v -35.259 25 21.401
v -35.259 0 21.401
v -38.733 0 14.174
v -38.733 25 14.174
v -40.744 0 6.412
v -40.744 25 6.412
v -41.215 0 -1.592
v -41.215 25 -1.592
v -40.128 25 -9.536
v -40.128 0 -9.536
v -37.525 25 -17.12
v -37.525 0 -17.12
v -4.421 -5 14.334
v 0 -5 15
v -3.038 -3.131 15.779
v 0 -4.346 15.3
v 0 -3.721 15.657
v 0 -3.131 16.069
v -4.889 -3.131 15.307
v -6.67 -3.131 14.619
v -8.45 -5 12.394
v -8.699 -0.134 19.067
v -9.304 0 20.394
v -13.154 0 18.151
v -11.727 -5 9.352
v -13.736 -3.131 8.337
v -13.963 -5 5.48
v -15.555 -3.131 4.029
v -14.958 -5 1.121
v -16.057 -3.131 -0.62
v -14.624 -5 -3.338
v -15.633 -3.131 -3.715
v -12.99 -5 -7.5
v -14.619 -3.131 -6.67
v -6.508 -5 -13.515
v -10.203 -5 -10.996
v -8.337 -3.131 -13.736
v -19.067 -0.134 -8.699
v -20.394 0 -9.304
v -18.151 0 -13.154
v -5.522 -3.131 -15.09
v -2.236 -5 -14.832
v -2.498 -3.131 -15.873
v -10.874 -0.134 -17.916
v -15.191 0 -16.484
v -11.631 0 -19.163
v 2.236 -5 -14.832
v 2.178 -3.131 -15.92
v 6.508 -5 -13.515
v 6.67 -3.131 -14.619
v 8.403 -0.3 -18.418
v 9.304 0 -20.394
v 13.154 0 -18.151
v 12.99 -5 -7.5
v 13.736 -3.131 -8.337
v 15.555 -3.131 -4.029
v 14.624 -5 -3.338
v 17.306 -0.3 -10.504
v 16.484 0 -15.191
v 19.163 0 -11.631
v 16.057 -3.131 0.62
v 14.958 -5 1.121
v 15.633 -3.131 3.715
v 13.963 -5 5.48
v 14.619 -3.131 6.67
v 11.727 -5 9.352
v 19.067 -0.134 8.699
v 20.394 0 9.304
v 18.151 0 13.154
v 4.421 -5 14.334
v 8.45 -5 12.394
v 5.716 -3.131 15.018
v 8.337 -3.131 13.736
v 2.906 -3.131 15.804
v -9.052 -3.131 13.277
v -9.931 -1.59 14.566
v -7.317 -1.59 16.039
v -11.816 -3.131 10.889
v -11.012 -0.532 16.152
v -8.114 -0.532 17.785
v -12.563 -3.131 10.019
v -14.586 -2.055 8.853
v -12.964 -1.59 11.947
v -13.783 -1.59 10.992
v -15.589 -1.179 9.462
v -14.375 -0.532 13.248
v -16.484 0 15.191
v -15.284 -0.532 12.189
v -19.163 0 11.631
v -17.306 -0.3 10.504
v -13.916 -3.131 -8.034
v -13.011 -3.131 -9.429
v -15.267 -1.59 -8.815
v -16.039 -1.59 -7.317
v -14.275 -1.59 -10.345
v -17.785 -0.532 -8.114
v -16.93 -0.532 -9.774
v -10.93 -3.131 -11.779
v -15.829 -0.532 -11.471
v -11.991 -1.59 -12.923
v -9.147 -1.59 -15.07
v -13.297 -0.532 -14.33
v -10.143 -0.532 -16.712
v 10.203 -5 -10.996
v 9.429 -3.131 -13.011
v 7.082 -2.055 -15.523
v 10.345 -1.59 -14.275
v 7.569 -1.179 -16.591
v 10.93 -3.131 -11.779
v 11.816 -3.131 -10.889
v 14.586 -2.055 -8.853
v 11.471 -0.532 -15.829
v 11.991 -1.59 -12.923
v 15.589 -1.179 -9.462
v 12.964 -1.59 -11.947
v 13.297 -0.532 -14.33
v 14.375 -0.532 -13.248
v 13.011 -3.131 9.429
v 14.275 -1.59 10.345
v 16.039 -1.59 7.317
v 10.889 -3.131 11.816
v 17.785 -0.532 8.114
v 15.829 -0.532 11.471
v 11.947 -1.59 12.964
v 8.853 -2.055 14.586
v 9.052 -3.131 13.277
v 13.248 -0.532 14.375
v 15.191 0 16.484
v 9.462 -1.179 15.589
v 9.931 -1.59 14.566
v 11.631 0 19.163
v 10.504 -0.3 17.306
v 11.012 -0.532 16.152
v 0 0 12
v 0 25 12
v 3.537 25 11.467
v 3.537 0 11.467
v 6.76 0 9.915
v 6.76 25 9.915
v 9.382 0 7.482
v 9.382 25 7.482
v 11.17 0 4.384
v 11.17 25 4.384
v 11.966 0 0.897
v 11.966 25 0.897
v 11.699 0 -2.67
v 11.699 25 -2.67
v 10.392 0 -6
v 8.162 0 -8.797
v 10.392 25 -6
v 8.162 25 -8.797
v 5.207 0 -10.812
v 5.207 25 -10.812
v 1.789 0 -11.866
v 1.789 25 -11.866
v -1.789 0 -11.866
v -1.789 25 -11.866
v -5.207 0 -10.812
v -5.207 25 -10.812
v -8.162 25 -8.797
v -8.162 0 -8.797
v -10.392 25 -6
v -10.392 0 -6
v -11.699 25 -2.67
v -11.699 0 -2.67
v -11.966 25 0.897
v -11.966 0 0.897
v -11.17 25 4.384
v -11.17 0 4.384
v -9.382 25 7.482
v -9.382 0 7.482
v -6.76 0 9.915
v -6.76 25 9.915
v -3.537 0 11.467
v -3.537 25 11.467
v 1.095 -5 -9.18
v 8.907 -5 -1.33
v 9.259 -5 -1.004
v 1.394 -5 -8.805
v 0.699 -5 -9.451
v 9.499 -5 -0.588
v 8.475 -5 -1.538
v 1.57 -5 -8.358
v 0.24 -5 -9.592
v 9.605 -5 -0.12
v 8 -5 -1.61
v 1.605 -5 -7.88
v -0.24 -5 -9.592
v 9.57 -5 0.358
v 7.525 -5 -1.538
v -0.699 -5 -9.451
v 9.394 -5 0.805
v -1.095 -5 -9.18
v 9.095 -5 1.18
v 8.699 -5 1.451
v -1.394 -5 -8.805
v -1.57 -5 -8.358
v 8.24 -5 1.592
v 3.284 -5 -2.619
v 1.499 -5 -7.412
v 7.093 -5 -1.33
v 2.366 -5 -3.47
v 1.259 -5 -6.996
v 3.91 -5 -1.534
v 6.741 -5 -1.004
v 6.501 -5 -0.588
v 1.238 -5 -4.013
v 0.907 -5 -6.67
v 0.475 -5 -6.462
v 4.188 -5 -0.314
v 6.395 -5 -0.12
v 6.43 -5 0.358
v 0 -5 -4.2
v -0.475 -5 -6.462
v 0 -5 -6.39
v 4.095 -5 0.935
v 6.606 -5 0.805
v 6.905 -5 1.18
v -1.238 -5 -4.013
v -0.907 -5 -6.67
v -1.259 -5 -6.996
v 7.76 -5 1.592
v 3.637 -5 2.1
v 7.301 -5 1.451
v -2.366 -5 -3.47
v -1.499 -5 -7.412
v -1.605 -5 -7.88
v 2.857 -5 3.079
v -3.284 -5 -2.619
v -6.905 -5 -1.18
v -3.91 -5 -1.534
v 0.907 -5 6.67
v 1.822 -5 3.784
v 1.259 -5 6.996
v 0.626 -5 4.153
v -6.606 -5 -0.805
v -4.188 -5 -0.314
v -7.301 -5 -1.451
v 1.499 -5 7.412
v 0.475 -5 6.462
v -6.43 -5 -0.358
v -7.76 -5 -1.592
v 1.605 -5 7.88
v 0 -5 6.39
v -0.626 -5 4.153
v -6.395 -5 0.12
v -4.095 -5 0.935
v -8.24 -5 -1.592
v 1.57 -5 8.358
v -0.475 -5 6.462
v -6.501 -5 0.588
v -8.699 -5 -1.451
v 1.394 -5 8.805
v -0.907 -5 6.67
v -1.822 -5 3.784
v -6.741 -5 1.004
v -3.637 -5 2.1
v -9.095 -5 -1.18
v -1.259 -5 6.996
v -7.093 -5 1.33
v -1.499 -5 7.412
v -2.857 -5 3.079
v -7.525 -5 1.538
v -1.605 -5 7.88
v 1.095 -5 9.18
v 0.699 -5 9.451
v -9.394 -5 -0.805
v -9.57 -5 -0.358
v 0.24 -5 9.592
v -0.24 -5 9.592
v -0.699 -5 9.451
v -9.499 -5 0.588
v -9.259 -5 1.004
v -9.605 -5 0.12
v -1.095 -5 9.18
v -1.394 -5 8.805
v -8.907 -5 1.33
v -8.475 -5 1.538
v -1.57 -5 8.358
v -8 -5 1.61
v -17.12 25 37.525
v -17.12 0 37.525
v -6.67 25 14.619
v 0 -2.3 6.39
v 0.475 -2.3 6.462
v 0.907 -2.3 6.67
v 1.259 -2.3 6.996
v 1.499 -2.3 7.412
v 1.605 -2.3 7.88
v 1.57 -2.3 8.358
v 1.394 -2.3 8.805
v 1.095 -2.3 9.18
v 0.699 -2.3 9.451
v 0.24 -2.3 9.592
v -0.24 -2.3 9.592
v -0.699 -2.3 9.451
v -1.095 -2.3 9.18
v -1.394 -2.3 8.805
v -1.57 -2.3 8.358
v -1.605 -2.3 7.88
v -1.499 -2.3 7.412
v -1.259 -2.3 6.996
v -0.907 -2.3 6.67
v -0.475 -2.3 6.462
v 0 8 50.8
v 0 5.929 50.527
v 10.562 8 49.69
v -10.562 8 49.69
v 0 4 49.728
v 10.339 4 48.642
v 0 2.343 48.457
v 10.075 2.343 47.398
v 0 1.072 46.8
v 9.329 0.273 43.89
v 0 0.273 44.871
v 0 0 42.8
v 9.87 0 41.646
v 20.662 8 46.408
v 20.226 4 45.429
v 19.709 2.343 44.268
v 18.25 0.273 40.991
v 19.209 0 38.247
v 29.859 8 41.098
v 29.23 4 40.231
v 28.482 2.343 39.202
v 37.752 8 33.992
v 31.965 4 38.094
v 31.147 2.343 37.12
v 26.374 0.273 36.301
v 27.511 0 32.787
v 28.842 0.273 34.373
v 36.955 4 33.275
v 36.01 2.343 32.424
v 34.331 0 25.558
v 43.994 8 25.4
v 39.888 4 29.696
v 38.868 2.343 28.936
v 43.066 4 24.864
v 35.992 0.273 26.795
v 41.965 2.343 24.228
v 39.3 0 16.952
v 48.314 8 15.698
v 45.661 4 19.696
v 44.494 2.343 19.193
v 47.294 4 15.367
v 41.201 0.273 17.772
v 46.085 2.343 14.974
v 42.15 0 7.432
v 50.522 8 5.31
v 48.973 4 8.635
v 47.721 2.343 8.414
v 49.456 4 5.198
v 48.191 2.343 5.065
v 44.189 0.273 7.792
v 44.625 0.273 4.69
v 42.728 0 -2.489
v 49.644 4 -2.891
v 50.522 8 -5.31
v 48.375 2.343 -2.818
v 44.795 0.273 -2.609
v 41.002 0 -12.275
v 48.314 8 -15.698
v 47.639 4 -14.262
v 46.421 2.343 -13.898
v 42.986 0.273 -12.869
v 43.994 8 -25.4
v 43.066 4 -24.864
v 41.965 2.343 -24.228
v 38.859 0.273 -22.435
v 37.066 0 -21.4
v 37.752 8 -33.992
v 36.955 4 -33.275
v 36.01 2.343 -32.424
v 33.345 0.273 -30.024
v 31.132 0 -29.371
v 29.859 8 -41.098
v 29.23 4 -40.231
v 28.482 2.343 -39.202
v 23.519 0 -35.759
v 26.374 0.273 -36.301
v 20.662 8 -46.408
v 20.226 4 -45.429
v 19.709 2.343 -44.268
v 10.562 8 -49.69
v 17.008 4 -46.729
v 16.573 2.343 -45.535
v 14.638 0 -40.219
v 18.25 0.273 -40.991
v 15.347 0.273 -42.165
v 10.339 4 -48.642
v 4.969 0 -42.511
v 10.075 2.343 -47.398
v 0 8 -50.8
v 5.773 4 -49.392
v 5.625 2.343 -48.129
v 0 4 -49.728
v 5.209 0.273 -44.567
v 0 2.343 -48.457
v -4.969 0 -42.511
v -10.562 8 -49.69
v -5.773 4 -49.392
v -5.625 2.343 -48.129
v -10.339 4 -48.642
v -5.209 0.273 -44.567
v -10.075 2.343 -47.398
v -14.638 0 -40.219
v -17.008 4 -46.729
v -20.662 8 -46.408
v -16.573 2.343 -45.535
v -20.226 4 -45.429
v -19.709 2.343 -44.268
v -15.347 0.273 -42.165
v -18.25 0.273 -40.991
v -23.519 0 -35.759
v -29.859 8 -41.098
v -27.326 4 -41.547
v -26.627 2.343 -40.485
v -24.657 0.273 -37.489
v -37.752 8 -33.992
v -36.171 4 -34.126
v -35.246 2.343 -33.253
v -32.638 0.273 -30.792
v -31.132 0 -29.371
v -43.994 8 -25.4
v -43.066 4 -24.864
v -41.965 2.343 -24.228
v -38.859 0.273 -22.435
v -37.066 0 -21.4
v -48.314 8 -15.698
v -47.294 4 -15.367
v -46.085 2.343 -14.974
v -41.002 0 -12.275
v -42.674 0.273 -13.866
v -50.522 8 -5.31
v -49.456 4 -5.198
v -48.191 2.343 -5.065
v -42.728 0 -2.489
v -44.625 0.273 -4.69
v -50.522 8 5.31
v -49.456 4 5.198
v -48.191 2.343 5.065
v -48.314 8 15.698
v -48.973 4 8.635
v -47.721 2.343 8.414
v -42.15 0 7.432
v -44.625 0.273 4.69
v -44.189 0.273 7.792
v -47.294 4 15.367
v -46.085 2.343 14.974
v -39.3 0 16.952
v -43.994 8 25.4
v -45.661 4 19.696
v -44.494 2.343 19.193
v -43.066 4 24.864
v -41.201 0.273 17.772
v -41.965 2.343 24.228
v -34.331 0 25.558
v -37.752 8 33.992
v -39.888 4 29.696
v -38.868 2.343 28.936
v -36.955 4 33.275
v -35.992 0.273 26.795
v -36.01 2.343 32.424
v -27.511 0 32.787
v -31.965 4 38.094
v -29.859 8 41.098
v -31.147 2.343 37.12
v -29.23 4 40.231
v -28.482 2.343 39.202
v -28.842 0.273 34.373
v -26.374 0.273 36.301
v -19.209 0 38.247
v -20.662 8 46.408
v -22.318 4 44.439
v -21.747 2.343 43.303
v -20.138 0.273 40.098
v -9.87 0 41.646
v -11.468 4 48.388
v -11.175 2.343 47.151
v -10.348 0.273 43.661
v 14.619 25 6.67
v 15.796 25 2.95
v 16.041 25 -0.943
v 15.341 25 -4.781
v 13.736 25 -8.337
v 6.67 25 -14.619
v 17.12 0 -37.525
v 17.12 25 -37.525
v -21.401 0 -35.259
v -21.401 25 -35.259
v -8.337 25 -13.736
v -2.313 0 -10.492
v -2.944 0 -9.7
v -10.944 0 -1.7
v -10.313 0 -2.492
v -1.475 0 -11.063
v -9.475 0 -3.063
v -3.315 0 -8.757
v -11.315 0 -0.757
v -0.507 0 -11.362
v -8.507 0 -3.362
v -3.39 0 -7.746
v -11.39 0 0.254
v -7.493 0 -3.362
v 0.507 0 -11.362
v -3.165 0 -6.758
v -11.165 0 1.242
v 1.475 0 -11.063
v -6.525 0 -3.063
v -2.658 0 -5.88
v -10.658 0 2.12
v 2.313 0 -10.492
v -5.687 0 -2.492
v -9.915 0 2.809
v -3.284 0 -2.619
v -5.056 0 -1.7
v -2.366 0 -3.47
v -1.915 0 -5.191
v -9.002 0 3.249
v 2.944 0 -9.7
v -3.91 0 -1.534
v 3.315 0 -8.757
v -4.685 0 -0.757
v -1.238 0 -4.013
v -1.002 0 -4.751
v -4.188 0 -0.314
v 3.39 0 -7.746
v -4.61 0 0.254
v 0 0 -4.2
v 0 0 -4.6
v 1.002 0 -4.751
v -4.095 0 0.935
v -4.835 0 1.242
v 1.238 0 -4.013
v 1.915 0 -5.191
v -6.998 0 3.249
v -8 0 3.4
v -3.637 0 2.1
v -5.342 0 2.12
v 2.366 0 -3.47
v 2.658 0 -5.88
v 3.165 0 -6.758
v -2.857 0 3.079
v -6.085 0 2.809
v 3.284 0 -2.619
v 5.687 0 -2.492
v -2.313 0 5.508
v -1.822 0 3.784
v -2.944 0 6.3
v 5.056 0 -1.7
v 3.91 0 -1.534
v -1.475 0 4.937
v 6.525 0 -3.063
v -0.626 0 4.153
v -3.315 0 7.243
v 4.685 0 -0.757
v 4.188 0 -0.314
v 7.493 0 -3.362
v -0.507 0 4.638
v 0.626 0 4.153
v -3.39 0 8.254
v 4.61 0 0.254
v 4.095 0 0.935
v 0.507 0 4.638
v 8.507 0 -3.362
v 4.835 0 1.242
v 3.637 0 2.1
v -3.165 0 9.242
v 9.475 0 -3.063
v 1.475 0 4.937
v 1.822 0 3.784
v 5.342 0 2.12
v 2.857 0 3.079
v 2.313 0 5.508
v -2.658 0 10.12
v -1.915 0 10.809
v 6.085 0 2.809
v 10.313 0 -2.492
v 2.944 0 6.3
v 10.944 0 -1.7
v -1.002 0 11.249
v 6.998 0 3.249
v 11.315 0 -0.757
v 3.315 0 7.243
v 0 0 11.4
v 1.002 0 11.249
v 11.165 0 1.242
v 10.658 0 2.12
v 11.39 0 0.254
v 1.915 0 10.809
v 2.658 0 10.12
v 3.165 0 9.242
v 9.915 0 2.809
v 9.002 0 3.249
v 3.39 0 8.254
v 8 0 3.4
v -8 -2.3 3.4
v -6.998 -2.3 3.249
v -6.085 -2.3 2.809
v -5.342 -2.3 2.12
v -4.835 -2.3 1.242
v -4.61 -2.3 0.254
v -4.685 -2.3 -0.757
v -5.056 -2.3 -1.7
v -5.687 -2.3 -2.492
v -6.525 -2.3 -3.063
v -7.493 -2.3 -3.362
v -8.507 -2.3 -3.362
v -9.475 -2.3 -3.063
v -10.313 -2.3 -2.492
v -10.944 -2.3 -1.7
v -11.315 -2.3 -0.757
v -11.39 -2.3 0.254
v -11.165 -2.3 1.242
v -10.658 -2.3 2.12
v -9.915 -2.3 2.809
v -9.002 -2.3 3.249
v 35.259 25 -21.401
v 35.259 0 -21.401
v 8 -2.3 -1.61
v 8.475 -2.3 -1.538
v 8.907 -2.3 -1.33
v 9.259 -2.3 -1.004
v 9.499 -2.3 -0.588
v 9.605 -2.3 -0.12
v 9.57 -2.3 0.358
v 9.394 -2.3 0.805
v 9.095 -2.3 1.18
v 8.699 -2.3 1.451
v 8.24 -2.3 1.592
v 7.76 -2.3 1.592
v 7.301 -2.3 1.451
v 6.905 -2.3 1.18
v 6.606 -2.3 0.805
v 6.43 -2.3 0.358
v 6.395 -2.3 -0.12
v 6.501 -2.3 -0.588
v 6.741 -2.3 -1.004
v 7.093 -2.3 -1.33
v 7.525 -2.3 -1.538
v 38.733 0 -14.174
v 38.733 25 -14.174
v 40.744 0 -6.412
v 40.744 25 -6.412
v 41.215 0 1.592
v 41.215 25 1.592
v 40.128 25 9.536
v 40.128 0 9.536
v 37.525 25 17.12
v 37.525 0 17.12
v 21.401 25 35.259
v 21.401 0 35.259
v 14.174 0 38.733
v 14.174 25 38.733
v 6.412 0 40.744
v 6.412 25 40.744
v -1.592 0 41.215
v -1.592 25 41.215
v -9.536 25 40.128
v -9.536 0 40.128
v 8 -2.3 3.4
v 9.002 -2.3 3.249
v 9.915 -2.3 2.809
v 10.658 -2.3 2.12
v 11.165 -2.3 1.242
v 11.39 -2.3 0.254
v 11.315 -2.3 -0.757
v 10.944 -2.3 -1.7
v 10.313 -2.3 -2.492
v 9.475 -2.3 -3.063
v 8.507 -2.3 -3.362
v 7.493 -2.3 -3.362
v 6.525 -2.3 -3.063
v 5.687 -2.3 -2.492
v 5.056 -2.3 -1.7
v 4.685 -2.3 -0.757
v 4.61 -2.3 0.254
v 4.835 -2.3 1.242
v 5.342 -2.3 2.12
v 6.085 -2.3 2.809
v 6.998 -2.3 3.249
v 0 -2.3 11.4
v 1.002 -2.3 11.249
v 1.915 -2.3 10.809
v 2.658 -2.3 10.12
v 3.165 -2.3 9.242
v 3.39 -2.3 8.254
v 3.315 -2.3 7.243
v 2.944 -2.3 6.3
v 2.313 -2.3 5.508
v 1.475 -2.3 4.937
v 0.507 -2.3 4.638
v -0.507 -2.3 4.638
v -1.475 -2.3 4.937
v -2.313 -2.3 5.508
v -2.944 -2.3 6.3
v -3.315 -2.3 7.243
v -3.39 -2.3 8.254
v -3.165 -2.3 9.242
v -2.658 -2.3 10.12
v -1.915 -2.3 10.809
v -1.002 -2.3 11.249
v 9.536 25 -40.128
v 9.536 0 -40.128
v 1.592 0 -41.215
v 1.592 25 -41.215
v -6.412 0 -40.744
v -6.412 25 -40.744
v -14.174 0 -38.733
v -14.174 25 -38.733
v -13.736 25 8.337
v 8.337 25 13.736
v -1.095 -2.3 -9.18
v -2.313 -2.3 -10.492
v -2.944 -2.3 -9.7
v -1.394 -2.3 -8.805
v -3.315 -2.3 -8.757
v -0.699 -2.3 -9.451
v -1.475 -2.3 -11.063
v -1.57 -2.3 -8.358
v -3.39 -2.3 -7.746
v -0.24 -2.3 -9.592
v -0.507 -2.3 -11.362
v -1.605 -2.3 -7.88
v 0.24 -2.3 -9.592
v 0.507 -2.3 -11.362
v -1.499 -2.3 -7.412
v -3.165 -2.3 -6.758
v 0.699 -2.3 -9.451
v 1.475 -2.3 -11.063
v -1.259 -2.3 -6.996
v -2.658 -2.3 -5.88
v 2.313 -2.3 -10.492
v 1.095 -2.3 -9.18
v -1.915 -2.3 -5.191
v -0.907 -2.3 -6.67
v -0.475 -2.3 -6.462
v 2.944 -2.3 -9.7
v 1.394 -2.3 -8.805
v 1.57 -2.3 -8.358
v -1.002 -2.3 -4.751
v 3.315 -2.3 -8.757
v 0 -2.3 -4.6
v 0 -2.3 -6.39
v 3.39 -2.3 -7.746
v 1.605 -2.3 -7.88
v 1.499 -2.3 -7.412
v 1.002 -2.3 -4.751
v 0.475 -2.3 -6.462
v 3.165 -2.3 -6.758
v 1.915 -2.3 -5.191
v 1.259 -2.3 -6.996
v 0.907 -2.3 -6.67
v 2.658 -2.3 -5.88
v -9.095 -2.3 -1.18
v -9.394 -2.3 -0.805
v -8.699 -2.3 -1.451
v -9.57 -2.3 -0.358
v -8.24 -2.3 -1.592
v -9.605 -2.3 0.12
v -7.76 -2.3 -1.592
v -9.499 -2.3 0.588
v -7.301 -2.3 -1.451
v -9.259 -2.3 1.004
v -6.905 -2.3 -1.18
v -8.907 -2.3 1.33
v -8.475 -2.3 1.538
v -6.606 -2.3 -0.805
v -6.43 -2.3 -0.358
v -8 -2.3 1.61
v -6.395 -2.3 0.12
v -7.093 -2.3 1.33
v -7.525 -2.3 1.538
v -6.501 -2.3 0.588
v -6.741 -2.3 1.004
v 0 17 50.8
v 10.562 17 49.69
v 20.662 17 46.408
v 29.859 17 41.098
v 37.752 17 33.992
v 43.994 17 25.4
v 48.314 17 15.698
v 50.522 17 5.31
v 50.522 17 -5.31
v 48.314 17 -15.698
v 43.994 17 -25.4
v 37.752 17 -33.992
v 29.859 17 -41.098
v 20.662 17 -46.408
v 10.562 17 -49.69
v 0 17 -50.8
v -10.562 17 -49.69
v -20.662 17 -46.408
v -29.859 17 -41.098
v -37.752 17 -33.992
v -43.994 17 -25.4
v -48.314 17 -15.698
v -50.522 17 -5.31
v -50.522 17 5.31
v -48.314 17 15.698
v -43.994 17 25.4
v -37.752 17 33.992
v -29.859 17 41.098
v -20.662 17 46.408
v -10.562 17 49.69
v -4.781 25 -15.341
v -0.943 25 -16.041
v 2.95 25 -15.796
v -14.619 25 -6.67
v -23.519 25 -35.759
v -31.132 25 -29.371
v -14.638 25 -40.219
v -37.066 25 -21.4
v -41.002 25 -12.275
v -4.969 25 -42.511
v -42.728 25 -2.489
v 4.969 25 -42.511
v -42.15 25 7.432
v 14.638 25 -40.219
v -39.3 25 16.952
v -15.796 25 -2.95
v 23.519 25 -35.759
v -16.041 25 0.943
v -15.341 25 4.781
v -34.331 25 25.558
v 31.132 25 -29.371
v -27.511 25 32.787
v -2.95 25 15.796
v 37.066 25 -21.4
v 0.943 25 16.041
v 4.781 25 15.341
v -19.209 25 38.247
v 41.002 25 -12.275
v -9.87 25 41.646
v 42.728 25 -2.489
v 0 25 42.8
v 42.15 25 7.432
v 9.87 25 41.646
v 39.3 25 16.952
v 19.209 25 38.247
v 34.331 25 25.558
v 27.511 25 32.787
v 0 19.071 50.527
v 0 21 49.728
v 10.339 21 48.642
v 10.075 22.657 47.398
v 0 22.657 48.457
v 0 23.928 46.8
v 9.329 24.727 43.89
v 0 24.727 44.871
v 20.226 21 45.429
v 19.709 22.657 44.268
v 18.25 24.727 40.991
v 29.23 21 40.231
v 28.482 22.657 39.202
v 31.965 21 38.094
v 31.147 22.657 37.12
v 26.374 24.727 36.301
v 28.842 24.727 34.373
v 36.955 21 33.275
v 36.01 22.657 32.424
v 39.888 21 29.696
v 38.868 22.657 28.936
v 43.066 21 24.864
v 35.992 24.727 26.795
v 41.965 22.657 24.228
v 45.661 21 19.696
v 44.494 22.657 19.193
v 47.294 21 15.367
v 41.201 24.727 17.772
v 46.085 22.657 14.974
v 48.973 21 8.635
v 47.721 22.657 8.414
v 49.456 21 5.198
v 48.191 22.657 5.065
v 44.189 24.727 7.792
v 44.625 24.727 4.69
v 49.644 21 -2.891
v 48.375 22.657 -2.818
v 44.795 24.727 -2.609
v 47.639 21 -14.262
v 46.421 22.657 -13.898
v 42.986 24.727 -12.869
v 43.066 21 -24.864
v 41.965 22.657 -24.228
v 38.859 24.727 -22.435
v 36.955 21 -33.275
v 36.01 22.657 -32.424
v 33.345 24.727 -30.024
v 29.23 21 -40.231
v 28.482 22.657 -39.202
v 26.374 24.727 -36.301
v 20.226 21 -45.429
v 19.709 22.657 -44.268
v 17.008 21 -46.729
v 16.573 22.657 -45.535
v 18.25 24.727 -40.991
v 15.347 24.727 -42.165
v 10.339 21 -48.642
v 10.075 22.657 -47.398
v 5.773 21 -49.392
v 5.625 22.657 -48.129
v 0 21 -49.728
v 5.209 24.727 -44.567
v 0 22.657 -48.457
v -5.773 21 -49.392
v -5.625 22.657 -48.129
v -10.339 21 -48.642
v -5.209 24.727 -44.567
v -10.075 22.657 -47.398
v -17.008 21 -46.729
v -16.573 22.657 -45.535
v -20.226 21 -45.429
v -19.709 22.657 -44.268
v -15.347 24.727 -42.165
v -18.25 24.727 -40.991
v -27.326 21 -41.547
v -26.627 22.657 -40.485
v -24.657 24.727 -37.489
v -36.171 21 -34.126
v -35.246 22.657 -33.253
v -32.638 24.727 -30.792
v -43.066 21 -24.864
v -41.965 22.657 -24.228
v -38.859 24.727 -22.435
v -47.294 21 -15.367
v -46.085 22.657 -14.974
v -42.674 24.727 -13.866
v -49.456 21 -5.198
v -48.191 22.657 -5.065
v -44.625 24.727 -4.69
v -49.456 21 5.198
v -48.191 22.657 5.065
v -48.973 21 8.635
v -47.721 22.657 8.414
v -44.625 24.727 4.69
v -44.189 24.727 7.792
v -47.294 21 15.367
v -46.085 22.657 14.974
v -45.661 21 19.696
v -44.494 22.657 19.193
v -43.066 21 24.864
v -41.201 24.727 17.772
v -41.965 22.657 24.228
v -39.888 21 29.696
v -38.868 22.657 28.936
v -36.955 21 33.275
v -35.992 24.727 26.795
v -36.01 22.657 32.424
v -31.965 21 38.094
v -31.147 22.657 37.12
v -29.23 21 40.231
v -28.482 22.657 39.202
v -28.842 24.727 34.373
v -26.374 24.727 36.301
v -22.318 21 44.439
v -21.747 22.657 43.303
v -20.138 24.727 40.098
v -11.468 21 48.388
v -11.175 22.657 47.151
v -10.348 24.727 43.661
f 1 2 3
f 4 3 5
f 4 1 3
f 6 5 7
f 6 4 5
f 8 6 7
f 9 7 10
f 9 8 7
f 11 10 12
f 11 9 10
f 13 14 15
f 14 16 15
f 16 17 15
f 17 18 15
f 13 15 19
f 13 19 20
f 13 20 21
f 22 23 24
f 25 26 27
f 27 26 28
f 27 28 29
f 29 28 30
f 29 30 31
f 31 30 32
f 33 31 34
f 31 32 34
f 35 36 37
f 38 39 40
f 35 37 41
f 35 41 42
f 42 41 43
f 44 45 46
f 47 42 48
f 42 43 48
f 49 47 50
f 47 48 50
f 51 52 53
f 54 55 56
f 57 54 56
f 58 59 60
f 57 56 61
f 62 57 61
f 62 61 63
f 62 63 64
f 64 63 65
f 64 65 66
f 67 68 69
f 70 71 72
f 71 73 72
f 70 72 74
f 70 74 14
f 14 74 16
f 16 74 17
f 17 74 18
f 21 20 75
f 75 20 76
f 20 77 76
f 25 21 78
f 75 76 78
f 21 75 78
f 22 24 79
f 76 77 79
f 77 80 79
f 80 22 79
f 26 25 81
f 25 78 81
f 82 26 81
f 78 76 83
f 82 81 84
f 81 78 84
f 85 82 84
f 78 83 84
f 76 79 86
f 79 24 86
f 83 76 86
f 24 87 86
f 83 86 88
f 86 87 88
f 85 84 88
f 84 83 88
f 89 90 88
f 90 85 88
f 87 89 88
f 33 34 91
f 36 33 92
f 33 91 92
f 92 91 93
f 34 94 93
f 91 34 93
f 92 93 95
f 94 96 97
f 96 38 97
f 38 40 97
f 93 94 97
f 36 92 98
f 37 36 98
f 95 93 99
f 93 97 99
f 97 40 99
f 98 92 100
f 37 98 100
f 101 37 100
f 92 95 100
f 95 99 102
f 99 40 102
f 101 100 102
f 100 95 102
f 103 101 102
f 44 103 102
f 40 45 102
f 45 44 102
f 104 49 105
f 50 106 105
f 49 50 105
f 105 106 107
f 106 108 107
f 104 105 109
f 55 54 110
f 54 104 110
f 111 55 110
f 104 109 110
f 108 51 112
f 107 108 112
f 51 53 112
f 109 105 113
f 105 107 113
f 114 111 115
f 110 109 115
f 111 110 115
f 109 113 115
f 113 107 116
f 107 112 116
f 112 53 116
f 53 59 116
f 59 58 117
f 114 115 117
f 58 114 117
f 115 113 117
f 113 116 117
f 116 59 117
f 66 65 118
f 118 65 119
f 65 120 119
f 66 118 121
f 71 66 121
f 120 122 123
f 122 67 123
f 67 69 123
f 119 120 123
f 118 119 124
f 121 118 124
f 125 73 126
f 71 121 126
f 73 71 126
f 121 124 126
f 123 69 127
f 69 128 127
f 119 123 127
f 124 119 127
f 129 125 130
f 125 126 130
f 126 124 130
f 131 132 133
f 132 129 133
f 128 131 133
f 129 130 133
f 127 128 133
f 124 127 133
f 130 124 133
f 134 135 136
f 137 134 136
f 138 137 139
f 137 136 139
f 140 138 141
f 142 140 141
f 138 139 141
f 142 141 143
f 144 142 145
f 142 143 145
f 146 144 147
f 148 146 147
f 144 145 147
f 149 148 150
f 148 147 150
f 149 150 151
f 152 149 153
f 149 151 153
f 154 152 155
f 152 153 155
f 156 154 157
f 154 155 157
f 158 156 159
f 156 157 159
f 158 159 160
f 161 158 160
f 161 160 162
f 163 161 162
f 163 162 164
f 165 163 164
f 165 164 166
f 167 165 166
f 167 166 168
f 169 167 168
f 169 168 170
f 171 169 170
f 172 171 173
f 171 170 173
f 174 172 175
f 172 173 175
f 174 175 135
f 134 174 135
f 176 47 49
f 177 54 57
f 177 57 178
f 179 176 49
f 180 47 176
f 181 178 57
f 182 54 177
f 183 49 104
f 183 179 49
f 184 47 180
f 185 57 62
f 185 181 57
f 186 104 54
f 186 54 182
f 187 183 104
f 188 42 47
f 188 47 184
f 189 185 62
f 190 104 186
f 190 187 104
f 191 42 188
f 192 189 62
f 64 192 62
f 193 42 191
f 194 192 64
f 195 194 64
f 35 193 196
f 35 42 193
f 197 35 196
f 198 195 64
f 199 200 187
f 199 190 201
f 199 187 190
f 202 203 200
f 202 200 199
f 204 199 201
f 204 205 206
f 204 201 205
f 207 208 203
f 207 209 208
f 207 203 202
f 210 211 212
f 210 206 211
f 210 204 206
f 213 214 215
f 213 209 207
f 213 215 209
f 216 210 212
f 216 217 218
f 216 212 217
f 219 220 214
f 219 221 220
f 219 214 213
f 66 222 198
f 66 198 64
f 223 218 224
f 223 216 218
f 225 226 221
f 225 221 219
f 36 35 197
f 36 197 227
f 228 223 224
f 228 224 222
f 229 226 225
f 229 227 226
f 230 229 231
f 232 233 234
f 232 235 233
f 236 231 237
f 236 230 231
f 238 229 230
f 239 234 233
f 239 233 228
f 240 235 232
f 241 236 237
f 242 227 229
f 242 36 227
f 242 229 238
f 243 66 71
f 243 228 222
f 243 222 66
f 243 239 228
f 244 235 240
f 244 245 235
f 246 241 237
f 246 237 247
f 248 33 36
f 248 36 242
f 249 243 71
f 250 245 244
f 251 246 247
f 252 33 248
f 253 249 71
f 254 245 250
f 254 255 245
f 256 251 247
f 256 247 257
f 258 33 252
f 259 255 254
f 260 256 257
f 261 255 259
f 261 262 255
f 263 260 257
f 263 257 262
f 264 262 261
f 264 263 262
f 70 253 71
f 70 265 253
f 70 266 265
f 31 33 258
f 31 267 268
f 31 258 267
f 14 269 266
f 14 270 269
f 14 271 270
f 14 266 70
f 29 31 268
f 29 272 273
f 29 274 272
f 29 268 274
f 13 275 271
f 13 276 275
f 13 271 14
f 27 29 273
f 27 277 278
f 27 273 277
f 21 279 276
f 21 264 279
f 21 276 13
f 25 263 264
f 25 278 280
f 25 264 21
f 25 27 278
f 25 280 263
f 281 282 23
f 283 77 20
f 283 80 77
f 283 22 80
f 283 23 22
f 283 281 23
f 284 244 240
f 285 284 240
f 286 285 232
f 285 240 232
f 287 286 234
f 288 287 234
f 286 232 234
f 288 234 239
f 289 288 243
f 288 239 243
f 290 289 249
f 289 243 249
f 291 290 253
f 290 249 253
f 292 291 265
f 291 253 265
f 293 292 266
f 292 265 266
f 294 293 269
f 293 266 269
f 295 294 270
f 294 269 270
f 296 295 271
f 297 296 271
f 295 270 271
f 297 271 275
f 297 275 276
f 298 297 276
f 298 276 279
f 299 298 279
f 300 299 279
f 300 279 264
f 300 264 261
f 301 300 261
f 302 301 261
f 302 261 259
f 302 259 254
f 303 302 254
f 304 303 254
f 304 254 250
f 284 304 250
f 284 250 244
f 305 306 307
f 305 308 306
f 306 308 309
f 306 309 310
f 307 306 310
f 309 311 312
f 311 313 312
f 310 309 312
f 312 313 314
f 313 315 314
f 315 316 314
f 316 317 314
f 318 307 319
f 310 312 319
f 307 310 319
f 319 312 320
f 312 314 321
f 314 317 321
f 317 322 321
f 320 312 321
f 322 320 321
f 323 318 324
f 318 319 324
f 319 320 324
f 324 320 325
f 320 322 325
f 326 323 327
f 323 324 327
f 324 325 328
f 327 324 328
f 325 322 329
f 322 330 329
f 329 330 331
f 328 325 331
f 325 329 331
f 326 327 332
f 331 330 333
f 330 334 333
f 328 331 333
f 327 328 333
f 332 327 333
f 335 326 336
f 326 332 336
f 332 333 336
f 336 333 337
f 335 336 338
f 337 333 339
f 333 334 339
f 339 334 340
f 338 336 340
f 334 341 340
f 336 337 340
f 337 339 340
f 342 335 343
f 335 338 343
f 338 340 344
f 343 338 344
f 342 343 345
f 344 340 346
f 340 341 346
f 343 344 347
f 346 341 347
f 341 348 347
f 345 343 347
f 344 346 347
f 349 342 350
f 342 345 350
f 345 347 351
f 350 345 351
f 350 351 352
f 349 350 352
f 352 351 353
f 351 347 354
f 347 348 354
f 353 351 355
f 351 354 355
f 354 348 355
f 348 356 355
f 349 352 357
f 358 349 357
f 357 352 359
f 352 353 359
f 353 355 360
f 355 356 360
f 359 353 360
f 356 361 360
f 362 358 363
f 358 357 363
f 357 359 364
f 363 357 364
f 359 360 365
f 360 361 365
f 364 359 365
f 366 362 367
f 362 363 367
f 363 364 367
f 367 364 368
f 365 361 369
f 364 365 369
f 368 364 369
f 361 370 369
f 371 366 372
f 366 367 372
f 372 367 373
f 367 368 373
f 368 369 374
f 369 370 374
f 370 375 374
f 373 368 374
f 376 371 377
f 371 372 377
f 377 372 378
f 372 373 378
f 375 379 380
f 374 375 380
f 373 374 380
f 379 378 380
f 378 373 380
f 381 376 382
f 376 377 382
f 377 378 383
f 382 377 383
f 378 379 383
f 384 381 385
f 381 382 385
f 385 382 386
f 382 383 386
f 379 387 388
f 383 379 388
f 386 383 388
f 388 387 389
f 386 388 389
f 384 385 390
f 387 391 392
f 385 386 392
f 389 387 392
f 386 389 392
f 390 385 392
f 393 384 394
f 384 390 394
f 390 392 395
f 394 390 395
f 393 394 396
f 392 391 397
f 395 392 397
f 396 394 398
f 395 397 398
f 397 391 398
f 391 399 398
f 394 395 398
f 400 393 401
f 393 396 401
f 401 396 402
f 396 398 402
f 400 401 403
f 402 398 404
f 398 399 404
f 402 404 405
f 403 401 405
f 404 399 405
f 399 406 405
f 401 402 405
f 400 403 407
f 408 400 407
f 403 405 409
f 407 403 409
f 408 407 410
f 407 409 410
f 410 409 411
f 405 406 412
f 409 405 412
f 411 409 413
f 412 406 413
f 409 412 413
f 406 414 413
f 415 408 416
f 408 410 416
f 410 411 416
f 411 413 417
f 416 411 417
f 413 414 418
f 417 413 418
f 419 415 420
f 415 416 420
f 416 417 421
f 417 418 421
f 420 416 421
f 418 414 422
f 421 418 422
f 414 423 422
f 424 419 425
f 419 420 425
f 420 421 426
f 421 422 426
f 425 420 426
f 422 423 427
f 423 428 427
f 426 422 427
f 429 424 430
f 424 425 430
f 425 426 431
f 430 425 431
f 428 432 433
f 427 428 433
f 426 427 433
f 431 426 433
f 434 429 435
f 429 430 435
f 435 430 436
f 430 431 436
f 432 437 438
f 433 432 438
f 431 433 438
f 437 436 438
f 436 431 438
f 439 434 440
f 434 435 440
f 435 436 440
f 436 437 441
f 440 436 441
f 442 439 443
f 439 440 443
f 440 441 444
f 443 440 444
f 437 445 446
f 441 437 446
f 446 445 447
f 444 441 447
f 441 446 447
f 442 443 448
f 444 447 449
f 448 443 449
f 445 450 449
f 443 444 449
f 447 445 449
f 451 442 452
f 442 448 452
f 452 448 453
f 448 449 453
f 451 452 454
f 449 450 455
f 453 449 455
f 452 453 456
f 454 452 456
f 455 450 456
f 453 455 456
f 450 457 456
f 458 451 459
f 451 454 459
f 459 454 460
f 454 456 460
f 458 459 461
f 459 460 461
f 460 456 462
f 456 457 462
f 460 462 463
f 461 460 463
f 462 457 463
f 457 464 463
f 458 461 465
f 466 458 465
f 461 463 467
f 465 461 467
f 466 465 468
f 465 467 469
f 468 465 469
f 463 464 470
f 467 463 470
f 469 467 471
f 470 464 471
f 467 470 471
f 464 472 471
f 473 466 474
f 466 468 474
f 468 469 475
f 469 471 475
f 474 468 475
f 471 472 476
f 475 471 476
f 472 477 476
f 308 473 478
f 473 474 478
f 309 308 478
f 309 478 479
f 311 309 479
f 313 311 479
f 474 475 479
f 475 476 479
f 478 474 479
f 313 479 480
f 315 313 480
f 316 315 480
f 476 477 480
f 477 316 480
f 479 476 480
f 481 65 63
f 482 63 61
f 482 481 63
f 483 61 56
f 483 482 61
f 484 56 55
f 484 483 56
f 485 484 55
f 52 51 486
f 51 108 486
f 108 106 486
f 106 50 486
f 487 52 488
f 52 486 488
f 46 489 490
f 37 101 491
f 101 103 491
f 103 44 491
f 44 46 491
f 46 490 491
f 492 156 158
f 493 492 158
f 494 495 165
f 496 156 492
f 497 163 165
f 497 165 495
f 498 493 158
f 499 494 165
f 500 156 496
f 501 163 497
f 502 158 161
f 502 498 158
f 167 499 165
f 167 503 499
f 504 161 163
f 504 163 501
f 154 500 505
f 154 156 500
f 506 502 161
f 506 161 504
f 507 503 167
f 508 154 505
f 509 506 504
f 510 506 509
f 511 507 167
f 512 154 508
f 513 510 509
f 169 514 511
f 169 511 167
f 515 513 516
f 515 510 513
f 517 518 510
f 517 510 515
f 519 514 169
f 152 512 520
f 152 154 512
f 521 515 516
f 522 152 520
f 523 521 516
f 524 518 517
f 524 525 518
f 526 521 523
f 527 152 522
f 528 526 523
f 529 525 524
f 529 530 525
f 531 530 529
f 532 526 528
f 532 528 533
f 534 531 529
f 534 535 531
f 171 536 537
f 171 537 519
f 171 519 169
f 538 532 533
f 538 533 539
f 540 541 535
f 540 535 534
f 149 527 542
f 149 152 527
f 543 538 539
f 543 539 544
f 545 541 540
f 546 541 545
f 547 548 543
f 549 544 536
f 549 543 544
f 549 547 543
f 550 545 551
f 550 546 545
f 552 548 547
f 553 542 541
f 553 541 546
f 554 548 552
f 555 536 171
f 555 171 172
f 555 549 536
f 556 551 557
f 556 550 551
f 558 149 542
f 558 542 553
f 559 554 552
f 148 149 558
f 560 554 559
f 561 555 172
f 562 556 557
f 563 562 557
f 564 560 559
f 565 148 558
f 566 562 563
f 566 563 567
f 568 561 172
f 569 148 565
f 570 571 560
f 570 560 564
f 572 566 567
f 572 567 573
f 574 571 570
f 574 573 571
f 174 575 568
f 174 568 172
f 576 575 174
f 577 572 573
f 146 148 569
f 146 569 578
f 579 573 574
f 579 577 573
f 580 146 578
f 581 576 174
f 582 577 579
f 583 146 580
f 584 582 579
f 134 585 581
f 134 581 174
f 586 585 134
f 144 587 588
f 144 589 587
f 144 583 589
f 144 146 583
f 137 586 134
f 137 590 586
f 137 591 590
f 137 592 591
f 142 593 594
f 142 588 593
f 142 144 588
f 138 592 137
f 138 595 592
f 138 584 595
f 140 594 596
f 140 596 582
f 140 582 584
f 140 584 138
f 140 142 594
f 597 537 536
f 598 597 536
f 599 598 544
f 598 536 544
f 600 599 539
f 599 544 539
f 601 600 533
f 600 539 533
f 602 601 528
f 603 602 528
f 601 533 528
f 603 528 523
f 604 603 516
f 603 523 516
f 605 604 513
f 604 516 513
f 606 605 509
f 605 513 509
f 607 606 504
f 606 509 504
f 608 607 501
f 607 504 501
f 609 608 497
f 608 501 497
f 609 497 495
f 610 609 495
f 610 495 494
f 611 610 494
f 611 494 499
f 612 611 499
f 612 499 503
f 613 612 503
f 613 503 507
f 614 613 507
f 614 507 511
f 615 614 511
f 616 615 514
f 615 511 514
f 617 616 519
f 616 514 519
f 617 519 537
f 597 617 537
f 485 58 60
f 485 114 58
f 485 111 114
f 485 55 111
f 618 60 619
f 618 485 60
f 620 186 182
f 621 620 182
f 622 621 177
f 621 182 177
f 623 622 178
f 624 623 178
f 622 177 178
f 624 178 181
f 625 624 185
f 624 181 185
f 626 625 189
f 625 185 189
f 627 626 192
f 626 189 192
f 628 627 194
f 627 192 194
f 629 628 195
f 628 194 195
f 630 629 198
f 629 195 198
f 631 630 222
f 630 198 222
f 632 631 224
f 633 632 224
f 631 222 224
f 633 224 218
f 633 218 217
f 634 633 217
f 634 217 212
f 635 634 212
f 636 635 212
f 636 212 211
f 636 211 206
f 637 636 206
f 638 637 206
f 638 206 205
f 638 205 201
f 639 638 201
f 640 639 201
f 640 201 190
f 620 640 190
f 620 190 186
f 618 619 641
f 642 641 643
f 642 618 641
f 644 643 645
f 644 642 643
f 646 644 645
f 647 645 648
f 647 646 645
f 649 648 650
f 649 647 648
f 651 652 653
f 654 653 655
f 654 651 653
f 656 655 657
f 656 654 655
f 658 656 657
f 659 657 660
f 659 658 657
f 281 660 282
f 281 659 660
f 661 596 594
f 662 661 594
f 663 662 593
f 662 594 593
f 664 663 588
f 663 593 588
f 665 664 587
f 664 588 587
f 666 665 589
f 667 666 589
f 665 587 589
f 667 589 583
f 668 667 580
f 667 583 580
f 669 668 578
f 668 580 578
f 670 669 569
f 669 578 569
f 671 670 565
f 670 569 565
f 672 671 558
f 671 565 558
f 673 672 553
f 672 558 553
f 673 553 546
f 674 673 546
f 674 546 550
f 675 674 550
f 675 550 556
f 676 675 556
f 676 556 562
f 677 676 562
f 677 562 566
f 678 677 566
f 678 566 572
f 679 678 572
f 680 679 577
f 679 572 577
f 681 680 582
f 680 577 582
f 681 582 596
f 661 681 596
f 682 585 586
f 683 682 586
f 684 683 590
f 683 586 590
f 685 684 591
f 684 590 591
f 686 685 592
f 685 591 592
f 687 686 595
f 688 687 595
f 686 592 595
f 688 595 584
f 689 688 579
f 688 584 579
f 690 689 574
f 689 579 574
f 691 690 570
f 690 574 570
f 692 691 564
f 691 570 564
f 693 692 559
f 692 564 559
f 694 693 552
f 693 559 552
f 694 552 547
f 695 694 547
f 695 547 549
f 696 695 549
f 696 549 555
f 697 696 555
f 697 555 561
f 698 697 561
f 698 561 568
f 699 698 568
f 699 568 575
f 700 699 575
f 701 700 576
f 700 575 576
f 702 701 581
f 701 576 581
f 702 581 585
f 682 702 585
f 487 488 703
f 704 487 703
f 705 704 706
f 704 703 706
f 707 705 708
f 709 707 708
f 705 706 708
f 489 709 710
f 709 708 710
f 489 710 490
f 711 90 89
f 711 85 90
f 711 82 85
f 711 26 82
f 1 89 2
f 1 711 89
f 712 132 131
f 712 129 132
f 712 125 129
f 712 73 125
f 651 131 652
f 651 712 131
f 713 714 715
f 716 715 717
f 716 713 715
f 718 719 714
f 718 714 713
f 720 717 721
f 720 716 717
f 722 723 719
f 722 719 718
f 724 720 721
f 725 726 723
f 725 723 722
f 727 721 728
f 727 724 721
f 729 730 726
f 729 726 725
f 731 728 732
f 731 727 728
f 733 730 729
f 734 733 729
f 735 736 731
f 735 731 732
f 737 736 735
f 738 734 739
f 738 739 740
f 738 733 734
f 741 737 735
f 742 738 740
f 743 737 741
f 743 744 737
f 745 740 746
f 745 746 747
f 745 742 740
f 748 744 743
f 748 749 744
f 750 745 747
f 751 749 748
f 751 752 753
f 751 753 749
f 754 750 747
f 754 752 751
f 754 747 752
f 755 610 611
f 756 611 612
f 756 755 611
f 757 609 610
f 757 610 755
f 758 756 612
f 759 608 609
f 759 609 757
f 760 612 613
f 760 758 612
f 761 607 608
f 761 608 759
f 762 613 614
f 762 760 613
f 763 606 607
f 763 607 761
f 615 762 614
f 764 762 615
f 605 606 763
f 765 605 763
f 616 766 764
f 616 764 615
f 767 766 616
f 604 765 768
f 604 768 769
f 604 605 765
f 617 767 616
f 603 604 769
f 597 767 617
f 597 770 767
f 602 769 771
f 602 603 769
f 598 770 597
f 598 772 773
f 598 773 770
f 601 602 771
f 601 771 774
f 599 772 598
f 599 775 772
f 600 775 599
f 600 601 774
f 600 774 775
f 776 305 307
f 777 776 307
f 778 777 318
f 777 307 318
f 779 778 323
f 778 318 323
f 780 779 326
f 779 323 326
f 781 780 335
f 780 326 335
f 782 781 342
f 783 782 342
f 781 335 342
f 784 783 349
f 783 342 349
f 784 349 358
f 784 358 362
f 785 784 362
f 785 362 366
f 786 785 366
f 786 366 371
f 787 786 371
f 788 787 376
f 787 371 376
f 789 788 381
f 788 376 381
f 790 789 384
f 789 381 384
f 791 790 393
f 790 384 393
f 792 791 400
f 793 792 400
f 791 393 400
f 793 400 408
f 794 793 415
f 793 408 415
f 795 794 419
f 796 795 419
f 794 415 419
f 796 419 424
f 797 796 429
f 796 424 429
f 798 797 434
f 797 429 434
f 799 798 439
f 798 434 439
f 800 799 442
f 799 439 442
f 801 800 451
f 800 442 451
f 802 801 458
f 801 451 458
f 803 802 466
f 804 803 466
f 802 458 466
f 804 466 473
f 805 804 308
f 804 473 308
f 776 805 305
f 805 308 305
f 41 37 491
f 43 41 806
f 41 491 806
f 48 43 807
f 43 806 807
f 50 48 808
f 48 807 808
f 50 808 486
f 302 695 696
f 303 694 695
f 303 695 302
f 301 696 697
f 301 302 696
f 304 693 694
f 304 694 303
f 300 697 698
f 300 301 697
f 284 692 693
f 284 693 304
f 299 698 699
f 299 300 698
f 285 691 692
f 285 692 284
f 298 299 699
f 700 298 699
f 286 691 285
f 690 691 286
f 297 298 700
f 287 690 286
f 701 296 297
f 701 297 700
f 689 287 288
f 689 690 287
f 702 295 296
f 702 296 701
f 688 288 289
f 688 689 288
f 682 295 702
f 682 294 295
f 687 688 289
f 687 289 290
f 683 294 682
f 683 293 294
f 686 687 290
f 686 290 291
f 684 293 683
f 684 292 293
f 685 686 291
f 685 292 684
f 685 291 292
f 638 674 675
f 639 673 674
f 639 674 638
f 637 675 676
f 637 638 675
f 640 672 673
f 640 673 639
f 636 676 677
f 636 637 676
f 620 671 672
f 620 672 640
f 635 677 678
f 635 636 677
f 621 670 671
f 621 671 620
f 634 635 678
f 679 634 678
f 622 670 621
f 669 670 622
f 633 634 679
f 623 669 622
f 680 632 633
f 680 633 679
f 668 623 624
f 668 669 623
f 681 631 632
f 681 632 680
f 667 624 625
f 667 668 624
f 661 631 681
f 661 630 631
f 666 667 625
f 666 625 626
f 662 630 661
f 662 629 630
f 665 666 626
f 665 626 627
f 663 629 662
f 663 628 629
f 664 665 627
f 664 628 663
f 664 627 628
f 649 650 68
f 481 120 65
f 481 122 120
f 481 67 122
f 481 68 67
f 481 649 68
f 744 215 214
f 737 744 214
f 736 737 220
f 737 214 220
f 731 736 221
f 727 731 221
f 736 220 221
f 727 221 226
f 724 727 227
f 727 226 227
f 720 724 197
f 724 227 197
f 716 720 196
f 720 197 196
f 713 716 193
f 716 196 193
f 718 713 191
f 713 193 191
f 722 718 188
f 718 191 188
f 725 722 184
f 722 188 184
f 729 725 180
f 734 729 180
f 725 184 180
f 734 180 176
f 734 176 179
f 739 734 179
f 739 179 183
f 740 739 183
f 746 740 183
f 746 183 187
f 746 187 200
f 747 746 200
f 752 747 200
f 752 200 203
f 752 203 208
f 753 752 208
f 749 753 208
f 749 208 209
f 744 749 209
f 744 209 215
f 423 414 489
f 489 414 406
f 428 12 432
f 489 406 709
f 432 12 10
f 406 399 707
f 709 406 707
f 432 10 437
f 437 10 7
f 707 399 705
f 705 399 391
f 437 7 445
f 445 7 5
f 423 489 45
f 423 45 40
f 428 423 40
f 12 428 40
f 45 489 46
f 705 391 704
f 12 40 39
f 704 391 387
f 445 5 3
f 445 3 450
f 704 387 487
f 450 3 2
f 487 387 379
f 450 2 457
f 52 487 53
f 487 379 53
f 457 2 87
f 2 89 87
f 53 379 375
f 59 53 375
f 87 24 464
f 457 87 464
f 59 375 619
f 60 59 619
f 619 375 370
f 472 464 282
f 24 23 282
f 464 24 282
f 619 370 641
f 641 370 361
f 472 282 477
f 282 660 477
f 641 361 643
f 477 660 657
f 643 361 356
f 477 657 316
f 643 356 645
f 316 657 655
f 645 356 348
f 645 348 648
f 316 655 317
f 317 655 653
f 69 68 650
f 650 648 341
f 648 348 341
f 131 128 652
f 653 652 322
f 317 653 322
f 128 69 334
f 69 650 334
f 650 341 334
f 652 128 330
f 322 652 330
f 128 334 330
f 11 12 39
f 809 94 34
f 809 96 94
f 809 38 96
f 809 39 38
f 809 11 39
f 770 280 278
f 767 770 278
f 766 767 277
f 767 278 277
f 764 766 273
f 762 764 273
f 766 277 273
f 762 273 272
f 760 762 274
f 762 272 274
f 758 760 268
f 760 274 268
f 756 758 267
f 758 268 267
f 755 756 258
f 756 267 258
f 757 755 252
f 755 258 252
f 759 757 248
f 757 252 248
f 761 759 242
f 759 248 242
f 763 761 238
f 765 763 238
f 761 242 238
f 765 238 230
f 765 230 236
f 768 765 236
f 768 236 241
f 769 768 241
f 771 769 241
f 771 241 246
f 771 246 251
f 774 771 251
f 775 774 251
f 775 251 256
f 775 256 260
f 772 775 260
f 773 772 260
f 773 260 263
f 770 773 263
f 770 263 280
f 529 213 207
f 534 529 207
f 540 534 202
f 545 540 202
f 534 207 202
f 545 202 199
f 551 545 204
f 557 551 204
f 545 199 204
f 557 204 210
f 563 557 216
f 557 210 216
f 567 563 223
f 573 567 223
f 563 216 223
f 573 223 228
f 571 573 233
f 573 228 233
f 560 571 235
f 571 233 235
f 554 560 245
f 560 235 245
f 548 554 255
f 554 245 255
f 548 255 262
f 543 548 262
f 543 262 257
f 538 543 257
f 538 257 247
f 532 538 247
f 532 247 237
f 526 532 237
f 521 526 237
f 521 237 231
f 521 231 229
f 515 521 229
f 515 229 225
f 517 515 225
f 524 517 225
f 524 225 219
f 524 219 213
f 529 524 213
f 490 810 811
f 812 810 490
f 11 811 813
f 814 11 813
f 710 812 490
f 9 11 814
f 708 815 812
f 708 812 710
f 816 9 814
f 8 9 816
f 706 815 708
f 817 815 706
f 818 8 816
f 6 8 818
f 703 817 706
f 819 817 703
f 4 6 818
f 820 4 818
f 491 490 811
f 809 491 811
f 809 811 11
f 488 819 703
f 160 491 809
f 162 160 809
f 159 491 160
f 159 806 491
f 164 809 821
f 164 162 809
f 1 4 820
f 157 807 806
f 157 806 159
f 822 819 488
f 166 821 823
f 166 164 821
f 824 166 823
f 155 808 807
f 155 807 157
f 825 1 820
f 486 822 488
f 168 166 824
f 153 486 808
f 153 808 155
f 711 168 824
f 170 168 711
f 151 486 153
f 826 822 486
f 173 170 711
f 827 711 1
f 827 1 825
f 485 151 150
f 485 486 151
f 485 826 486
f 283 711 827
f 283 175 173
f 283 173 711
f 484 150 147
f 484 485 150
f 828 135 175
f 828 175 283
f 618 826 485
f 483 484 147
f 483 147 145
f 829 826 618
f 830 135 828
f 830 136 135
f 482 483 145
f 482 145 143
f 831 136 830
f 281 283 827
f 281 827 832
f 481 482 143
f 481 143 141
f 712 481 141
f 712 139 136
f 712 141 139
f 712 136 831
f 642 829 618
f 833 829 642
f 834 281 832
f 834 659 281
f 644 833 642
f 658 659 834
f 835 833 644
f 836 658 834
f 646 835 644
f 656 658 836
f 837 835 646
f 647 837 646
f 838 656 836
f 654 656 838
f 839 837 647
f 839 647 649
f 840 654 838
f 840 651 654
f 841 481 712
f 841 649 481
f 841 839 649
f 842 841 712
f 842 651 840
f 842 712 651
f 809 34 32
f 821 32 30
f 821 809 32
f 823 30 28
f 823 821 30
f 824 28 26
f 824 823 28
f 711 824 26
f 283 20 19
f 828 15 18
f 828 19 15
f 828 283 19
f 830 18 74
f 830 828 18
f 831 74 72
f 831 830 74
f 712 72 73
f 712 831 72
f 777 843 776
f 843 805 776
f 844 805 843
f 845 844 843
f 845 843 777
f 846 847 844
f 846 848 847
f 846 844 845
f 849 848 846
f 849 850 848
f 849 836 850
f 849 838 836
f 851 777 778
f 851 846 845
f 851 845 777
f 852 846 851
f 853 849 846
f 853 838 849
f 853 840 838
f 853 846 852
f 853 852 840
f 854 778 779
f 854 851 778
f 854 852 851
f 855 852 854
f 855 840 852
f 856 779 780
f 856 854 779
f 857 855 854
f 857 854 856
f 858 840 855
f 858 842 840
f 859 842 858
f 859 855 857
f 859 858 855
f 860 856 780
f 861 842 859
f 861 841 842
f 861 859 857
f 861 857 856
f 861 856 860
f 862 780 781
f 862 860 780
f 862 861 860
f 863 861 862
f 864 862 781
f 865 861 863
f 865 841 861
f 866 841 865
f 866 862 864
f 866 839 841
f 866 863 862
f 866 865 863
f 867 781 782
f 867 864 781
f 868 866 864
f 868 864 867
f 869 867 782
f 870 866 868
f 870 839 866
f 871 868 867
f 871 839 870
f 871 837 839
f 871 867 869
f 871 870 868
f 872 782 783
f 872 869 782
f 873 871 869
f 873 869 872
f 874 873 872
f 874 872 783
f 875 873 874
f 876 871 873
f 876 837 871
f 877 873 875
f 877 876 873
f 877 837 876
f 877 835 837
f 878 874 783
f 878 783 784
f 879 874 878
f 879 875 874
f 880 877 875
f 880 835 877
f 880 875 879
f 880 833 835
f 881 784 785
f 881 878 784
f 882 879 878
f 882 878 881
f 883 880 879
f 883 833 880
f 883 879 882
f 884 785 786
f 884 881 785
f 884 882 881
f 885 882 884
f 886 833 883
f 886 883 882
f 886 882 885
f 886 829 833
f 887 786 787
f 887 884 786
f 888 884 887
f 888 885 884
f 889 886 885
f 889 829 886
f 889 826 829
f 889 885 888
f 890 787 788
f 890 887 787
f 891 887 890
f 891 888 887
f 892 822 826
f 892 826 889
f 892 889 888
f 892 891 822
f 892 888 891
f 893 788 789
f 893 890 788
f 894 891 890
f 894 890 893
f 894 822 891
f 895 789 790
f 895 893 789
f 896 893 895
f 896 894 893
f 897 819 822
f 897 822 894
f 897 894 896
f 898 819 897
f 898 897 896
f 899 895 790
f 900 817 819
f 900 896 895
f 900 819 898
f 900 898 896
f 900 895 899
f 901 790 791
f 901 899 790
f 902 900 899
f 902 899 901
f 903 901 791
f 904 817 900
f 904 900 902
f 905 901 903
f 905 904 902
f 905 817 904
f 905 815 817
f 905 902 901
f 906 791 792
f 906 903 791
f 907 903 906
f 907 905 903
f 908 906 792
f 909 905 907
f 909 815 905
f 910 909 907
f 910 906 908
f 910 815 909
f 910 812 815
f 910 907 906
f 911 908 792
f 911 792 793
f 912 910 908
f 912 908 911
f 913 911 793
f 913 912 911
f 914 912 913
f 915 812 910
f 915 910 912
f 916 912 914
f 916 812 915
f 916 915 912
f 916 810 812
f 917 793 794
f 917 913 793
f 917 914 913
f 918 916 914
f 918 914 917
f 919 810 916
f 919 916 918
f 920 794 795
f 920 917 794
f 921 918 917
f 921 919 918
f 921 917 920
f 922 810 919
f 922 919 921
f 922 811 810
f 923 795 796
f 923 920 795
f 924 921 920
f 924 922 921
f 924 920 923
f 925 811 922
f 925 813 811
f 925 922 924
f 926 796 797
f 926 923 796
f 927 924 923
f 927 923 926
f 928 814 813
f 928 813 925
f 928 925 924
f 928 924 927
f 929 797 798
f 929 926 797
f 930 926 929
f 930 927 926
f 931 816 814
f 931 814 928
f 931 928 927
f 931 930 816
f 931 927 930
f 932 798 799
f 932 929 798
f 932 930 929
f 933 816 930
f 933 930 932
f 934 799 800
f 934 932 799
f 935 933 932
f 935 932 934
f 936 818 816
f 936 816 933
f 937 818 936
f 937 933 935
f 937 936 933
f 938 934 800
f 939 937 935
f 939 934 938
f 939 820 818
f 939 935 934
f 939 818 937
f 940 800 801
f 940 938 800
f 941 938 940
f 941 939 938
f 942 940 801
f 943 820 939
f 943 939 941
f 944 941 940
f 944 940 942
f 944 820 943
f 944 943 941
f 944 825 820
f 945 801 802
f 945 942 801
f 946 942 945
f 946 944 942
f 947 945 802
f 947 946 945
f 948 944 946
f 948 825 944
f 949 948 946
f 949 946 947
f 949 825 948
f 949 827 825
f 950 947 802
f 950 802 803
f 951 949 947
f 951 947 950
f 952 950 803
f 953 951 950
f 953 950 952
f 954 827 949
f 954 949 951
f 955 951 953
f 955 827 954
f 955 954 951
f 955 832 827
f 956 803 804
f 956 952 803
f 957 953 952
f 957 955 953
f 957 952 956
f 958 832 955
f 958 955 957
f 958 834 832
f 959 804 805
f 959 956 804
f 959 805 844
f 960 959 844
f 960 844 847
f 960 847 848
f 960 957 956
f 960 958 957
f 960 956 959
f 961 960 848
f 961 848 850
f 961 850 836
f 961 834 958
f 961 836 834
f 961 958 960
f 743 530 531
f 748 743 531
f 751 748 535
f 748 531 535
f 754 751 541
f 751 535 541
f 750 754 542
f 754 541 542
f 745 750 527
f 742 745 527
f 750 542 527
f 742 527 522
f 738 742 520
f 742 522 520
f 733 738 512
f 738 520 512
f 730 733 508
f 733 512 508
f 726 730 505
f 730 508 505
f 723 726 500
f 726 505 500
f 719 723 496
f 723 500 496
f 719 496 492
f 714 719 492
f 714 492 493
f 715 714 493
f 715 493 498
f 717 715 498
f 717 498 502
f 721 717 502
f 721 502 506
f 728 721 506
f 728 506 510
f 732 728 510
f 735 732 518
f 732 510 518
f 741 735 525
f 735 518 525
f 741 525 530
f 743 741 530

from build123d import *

# Parameters (mm, degrees)
SKETCH1_R           = 50.8
BOSS_EXTRUDE1_DEPTH = 25
FILLET2_R           = 8
FILLET3_R           = 8
SKETCH2_R           = 15
BOSS_EXTRUDE2_DEPTH = 5
SKETCH3_R           = 12
CUT_EXTRUDE1_DEPTH  = 25
FILLET4_R           = 8
SKETCH5_R           = 1.61
SKETCH5_R_2         = 4.2
CUT_EXTRUDE2_DEPTH  = 78.85422275
CUT_EXTRUDE3_DEPTH  = 78.85422275
SKETCH7_R           = 3.4
CUT_EXTRUDE4_DEPTH  = 2.3


with BuildPart() as part:
    # Sketch1 → Boss-Extrude1 (new body)
    with BuildSketch(Plane(origin=(0, 0, 0), x_dir=(1, 0, 0), z_dir=(0, 1, 0))):
        with Locations(Location((0, 0, 0), (0, 0, 270))):
            Circle(SKETCH1_R)
    extrude(amount=BOSS_EXTRUDE1_DEPTH)

    # Fillet2
    fillet2_edges = [part.edges().sort_by_distance(p)[0] for p in [
        (0, 25, -50.8),
    ]]
    fillet(fillet2_edges, radius=FILLET2_R)

    # Fillet3
    fillet3_edges = [part.edges().sort_by_distance(p)[0] for p in [
        (0, 0, -50.8),
    ]]
    fillet(fillet3_edges, radius=FILLET3_R)

    # Sketch2 → Boss-Extrude2 (add)
    with BuildSketch(Plane.XZ):
        with Locations(Location((0, 0, 0), (0, 0, 90))):
            Circle(SKETCH2_R)
    extrude(amount=BOSS_EXTRUDE2_DEPTH)

    # Sketch3 → Cut-Extrude1 (cut)
    with BuildSketch(Plane(origin=(0, 25, 0), x_dir=(1, 0, 0), z_dir=(0, 1, 0))):
        with Locations(Location((0, 0, 0), (0, 0, 270))):
            Circle(SKETCH3_R)
    extrude(amount=-CUT_EXTRUDE1_DEPTH, mode=Mode.SUBTRACT)

    # Fillet4
    # the kernel refuses this fillet: 8 mm, written as the material it adds along each edge
    with BuildSketch(Plane(origin=(0, 0, 0), x_dir=(0, 0, 1), z_dir=(1, 0, 0))) as fillet4_piece_1:
        with BuildLine():
            CenterArc((22.416198487, 8), FILLET4_R, 202.024312837, 67.975687163)
            Line((15, 5), (14.85167603, 4.94))
            ThreePointArc((14.85167603, 4.94), (14.84, 2.5), (14.84, 0))
            Line((14.84, 0), (15, -0.16))
            Line((15, -0.16), (22.416198487, -0.16))
            Line((22.416198487, -0.16), (22.416198487, 0))
        make_face()
    revolve(axis=Axis((0, 0, 0), (0, -1, 0)))

    # Sketch5 → Cut-Extrude2 (cut, through all)
    with BuildSketch(Plane.XZ.offset(5)):
        with Locations(Location((0, 8, 0), (0, 0, 270))):
            Circle(SKETCH5_R)
        with Locations(Location((0, -8, 0), (0, 0, 90))):
            Circle(SKETCH5_R)
        with Locations(Location((8, 0, 0), (0, 0, 270))):
            Circle(SKETCH5_R)
        with Locations(Location((-8, 0, 0), (0, 0, 90))):
            Circle(SKETCH5_R)
        with Locations(Location((0, 0, 0), (0, 0, 270))):
            Circle(SKETCH5_R_2)
    extrude(amount=-CUT_EXTRUDE2_DEPTH, mode=Mode.SUBTRACT)

    # Sketch6 → Cut-Extrude3 (cut, through all)
    with BuildSketch(Plane(origin=(0, 25, 0), x_dir=(1, 0, 0), z_dir=(0, 1, 0))):
        with BuildLine():
            Line((6.669640143, 14.619160774), (17.119775233, 37.524775128))
            ThreePointArc((17.119775233, 37.524775128), (-2.42176691, 41.174391282), (-21.4007271, 35.259102825))
            Line((-21.4007271, 35.259102825), (-8.337442905, 13.736484528))
            ThreePointArc((-8.337442905, 13.736484528), (-0.943488661, 16.041003414), (6.669640143, 14.619160774))
        make_face()
        with BuildLine():
            Line((13.736484528, 8.337442905), (35.259102825, 21.4007271))
            ThreePointArc((35.259102825, 21.4007271), (41.174391282, 2.42176691), (37.524775128, -17.119775233))
            Line((37.524775128, -17.119775233), (14.619160774, -6.669640143))
            ThreePointArc((14.619160774, -6.669640143), (16.041003414, 0.943488661), (13.736484528, 8.337442905))
        make_face()
        with BuildLine():
            Line((8.337442905, -13.736484528), (21.4007271, -35.259102825))
            ThreePointArc((21.4007271, -35.259102825), (2.42176691, -41.174391282), (-17.119775233, -37.524775128))
            Line((-17.119775233, -37.524775128), (-6.669640143, -14.619160774))
            ThreePointArc((-6.669640143, -14.619160774), (0.943488661, -16.041003414), (8.337442905, -13.736484528))
        make_face()
        with BuildLine():
            Line((-13.736484528, -8.337442905), (-35.259102825, -21.4007271))
            ThreePointArc((-35.259102825, -21.4007271), (-41.174391282, -2.42176691), (-37.524775128, 17.119775233))
            Line((-37.524775128, 17.119775233), (-14.619160774, 6.669640143))
            ThreePointArc((-14.619160774, 6.669640143), (-16.041003414, -0.943488661), (-13.736484528, -8.337442905))
        make_face()
    extrude(amount=-CUT_EXTRUDE3_DEPTH, mode=Mode.SUBTRACT)

    # Sketch7 → Cut-Extrude4 (cut)
    with BuildSketch(Plane(origin=(0, 0, 0), x_dir=(1, 0, 0), z_dir=(0, 1, 0))):
        with Locations(Location((-8, 0, 0), (0, 0, 270))):
            Circle(SKETCH7_R)
        with Locations(Location((0, 8, 0), (0, 0, 270))):
            Circle(SKETCH7_R)
        with Locations(Location((8, 0, 0), (0, 0, 270))):
            Circle(SKETCH7_R)
        with Locations(Location((0, -8, 0), (0, 0, 270))):
            Circle(SKETCH7_R)
    extrude(amount=-CUT_EXTRUDE4_DEPTH, mode=Mode.SUBTRACT)


solid = part.part
